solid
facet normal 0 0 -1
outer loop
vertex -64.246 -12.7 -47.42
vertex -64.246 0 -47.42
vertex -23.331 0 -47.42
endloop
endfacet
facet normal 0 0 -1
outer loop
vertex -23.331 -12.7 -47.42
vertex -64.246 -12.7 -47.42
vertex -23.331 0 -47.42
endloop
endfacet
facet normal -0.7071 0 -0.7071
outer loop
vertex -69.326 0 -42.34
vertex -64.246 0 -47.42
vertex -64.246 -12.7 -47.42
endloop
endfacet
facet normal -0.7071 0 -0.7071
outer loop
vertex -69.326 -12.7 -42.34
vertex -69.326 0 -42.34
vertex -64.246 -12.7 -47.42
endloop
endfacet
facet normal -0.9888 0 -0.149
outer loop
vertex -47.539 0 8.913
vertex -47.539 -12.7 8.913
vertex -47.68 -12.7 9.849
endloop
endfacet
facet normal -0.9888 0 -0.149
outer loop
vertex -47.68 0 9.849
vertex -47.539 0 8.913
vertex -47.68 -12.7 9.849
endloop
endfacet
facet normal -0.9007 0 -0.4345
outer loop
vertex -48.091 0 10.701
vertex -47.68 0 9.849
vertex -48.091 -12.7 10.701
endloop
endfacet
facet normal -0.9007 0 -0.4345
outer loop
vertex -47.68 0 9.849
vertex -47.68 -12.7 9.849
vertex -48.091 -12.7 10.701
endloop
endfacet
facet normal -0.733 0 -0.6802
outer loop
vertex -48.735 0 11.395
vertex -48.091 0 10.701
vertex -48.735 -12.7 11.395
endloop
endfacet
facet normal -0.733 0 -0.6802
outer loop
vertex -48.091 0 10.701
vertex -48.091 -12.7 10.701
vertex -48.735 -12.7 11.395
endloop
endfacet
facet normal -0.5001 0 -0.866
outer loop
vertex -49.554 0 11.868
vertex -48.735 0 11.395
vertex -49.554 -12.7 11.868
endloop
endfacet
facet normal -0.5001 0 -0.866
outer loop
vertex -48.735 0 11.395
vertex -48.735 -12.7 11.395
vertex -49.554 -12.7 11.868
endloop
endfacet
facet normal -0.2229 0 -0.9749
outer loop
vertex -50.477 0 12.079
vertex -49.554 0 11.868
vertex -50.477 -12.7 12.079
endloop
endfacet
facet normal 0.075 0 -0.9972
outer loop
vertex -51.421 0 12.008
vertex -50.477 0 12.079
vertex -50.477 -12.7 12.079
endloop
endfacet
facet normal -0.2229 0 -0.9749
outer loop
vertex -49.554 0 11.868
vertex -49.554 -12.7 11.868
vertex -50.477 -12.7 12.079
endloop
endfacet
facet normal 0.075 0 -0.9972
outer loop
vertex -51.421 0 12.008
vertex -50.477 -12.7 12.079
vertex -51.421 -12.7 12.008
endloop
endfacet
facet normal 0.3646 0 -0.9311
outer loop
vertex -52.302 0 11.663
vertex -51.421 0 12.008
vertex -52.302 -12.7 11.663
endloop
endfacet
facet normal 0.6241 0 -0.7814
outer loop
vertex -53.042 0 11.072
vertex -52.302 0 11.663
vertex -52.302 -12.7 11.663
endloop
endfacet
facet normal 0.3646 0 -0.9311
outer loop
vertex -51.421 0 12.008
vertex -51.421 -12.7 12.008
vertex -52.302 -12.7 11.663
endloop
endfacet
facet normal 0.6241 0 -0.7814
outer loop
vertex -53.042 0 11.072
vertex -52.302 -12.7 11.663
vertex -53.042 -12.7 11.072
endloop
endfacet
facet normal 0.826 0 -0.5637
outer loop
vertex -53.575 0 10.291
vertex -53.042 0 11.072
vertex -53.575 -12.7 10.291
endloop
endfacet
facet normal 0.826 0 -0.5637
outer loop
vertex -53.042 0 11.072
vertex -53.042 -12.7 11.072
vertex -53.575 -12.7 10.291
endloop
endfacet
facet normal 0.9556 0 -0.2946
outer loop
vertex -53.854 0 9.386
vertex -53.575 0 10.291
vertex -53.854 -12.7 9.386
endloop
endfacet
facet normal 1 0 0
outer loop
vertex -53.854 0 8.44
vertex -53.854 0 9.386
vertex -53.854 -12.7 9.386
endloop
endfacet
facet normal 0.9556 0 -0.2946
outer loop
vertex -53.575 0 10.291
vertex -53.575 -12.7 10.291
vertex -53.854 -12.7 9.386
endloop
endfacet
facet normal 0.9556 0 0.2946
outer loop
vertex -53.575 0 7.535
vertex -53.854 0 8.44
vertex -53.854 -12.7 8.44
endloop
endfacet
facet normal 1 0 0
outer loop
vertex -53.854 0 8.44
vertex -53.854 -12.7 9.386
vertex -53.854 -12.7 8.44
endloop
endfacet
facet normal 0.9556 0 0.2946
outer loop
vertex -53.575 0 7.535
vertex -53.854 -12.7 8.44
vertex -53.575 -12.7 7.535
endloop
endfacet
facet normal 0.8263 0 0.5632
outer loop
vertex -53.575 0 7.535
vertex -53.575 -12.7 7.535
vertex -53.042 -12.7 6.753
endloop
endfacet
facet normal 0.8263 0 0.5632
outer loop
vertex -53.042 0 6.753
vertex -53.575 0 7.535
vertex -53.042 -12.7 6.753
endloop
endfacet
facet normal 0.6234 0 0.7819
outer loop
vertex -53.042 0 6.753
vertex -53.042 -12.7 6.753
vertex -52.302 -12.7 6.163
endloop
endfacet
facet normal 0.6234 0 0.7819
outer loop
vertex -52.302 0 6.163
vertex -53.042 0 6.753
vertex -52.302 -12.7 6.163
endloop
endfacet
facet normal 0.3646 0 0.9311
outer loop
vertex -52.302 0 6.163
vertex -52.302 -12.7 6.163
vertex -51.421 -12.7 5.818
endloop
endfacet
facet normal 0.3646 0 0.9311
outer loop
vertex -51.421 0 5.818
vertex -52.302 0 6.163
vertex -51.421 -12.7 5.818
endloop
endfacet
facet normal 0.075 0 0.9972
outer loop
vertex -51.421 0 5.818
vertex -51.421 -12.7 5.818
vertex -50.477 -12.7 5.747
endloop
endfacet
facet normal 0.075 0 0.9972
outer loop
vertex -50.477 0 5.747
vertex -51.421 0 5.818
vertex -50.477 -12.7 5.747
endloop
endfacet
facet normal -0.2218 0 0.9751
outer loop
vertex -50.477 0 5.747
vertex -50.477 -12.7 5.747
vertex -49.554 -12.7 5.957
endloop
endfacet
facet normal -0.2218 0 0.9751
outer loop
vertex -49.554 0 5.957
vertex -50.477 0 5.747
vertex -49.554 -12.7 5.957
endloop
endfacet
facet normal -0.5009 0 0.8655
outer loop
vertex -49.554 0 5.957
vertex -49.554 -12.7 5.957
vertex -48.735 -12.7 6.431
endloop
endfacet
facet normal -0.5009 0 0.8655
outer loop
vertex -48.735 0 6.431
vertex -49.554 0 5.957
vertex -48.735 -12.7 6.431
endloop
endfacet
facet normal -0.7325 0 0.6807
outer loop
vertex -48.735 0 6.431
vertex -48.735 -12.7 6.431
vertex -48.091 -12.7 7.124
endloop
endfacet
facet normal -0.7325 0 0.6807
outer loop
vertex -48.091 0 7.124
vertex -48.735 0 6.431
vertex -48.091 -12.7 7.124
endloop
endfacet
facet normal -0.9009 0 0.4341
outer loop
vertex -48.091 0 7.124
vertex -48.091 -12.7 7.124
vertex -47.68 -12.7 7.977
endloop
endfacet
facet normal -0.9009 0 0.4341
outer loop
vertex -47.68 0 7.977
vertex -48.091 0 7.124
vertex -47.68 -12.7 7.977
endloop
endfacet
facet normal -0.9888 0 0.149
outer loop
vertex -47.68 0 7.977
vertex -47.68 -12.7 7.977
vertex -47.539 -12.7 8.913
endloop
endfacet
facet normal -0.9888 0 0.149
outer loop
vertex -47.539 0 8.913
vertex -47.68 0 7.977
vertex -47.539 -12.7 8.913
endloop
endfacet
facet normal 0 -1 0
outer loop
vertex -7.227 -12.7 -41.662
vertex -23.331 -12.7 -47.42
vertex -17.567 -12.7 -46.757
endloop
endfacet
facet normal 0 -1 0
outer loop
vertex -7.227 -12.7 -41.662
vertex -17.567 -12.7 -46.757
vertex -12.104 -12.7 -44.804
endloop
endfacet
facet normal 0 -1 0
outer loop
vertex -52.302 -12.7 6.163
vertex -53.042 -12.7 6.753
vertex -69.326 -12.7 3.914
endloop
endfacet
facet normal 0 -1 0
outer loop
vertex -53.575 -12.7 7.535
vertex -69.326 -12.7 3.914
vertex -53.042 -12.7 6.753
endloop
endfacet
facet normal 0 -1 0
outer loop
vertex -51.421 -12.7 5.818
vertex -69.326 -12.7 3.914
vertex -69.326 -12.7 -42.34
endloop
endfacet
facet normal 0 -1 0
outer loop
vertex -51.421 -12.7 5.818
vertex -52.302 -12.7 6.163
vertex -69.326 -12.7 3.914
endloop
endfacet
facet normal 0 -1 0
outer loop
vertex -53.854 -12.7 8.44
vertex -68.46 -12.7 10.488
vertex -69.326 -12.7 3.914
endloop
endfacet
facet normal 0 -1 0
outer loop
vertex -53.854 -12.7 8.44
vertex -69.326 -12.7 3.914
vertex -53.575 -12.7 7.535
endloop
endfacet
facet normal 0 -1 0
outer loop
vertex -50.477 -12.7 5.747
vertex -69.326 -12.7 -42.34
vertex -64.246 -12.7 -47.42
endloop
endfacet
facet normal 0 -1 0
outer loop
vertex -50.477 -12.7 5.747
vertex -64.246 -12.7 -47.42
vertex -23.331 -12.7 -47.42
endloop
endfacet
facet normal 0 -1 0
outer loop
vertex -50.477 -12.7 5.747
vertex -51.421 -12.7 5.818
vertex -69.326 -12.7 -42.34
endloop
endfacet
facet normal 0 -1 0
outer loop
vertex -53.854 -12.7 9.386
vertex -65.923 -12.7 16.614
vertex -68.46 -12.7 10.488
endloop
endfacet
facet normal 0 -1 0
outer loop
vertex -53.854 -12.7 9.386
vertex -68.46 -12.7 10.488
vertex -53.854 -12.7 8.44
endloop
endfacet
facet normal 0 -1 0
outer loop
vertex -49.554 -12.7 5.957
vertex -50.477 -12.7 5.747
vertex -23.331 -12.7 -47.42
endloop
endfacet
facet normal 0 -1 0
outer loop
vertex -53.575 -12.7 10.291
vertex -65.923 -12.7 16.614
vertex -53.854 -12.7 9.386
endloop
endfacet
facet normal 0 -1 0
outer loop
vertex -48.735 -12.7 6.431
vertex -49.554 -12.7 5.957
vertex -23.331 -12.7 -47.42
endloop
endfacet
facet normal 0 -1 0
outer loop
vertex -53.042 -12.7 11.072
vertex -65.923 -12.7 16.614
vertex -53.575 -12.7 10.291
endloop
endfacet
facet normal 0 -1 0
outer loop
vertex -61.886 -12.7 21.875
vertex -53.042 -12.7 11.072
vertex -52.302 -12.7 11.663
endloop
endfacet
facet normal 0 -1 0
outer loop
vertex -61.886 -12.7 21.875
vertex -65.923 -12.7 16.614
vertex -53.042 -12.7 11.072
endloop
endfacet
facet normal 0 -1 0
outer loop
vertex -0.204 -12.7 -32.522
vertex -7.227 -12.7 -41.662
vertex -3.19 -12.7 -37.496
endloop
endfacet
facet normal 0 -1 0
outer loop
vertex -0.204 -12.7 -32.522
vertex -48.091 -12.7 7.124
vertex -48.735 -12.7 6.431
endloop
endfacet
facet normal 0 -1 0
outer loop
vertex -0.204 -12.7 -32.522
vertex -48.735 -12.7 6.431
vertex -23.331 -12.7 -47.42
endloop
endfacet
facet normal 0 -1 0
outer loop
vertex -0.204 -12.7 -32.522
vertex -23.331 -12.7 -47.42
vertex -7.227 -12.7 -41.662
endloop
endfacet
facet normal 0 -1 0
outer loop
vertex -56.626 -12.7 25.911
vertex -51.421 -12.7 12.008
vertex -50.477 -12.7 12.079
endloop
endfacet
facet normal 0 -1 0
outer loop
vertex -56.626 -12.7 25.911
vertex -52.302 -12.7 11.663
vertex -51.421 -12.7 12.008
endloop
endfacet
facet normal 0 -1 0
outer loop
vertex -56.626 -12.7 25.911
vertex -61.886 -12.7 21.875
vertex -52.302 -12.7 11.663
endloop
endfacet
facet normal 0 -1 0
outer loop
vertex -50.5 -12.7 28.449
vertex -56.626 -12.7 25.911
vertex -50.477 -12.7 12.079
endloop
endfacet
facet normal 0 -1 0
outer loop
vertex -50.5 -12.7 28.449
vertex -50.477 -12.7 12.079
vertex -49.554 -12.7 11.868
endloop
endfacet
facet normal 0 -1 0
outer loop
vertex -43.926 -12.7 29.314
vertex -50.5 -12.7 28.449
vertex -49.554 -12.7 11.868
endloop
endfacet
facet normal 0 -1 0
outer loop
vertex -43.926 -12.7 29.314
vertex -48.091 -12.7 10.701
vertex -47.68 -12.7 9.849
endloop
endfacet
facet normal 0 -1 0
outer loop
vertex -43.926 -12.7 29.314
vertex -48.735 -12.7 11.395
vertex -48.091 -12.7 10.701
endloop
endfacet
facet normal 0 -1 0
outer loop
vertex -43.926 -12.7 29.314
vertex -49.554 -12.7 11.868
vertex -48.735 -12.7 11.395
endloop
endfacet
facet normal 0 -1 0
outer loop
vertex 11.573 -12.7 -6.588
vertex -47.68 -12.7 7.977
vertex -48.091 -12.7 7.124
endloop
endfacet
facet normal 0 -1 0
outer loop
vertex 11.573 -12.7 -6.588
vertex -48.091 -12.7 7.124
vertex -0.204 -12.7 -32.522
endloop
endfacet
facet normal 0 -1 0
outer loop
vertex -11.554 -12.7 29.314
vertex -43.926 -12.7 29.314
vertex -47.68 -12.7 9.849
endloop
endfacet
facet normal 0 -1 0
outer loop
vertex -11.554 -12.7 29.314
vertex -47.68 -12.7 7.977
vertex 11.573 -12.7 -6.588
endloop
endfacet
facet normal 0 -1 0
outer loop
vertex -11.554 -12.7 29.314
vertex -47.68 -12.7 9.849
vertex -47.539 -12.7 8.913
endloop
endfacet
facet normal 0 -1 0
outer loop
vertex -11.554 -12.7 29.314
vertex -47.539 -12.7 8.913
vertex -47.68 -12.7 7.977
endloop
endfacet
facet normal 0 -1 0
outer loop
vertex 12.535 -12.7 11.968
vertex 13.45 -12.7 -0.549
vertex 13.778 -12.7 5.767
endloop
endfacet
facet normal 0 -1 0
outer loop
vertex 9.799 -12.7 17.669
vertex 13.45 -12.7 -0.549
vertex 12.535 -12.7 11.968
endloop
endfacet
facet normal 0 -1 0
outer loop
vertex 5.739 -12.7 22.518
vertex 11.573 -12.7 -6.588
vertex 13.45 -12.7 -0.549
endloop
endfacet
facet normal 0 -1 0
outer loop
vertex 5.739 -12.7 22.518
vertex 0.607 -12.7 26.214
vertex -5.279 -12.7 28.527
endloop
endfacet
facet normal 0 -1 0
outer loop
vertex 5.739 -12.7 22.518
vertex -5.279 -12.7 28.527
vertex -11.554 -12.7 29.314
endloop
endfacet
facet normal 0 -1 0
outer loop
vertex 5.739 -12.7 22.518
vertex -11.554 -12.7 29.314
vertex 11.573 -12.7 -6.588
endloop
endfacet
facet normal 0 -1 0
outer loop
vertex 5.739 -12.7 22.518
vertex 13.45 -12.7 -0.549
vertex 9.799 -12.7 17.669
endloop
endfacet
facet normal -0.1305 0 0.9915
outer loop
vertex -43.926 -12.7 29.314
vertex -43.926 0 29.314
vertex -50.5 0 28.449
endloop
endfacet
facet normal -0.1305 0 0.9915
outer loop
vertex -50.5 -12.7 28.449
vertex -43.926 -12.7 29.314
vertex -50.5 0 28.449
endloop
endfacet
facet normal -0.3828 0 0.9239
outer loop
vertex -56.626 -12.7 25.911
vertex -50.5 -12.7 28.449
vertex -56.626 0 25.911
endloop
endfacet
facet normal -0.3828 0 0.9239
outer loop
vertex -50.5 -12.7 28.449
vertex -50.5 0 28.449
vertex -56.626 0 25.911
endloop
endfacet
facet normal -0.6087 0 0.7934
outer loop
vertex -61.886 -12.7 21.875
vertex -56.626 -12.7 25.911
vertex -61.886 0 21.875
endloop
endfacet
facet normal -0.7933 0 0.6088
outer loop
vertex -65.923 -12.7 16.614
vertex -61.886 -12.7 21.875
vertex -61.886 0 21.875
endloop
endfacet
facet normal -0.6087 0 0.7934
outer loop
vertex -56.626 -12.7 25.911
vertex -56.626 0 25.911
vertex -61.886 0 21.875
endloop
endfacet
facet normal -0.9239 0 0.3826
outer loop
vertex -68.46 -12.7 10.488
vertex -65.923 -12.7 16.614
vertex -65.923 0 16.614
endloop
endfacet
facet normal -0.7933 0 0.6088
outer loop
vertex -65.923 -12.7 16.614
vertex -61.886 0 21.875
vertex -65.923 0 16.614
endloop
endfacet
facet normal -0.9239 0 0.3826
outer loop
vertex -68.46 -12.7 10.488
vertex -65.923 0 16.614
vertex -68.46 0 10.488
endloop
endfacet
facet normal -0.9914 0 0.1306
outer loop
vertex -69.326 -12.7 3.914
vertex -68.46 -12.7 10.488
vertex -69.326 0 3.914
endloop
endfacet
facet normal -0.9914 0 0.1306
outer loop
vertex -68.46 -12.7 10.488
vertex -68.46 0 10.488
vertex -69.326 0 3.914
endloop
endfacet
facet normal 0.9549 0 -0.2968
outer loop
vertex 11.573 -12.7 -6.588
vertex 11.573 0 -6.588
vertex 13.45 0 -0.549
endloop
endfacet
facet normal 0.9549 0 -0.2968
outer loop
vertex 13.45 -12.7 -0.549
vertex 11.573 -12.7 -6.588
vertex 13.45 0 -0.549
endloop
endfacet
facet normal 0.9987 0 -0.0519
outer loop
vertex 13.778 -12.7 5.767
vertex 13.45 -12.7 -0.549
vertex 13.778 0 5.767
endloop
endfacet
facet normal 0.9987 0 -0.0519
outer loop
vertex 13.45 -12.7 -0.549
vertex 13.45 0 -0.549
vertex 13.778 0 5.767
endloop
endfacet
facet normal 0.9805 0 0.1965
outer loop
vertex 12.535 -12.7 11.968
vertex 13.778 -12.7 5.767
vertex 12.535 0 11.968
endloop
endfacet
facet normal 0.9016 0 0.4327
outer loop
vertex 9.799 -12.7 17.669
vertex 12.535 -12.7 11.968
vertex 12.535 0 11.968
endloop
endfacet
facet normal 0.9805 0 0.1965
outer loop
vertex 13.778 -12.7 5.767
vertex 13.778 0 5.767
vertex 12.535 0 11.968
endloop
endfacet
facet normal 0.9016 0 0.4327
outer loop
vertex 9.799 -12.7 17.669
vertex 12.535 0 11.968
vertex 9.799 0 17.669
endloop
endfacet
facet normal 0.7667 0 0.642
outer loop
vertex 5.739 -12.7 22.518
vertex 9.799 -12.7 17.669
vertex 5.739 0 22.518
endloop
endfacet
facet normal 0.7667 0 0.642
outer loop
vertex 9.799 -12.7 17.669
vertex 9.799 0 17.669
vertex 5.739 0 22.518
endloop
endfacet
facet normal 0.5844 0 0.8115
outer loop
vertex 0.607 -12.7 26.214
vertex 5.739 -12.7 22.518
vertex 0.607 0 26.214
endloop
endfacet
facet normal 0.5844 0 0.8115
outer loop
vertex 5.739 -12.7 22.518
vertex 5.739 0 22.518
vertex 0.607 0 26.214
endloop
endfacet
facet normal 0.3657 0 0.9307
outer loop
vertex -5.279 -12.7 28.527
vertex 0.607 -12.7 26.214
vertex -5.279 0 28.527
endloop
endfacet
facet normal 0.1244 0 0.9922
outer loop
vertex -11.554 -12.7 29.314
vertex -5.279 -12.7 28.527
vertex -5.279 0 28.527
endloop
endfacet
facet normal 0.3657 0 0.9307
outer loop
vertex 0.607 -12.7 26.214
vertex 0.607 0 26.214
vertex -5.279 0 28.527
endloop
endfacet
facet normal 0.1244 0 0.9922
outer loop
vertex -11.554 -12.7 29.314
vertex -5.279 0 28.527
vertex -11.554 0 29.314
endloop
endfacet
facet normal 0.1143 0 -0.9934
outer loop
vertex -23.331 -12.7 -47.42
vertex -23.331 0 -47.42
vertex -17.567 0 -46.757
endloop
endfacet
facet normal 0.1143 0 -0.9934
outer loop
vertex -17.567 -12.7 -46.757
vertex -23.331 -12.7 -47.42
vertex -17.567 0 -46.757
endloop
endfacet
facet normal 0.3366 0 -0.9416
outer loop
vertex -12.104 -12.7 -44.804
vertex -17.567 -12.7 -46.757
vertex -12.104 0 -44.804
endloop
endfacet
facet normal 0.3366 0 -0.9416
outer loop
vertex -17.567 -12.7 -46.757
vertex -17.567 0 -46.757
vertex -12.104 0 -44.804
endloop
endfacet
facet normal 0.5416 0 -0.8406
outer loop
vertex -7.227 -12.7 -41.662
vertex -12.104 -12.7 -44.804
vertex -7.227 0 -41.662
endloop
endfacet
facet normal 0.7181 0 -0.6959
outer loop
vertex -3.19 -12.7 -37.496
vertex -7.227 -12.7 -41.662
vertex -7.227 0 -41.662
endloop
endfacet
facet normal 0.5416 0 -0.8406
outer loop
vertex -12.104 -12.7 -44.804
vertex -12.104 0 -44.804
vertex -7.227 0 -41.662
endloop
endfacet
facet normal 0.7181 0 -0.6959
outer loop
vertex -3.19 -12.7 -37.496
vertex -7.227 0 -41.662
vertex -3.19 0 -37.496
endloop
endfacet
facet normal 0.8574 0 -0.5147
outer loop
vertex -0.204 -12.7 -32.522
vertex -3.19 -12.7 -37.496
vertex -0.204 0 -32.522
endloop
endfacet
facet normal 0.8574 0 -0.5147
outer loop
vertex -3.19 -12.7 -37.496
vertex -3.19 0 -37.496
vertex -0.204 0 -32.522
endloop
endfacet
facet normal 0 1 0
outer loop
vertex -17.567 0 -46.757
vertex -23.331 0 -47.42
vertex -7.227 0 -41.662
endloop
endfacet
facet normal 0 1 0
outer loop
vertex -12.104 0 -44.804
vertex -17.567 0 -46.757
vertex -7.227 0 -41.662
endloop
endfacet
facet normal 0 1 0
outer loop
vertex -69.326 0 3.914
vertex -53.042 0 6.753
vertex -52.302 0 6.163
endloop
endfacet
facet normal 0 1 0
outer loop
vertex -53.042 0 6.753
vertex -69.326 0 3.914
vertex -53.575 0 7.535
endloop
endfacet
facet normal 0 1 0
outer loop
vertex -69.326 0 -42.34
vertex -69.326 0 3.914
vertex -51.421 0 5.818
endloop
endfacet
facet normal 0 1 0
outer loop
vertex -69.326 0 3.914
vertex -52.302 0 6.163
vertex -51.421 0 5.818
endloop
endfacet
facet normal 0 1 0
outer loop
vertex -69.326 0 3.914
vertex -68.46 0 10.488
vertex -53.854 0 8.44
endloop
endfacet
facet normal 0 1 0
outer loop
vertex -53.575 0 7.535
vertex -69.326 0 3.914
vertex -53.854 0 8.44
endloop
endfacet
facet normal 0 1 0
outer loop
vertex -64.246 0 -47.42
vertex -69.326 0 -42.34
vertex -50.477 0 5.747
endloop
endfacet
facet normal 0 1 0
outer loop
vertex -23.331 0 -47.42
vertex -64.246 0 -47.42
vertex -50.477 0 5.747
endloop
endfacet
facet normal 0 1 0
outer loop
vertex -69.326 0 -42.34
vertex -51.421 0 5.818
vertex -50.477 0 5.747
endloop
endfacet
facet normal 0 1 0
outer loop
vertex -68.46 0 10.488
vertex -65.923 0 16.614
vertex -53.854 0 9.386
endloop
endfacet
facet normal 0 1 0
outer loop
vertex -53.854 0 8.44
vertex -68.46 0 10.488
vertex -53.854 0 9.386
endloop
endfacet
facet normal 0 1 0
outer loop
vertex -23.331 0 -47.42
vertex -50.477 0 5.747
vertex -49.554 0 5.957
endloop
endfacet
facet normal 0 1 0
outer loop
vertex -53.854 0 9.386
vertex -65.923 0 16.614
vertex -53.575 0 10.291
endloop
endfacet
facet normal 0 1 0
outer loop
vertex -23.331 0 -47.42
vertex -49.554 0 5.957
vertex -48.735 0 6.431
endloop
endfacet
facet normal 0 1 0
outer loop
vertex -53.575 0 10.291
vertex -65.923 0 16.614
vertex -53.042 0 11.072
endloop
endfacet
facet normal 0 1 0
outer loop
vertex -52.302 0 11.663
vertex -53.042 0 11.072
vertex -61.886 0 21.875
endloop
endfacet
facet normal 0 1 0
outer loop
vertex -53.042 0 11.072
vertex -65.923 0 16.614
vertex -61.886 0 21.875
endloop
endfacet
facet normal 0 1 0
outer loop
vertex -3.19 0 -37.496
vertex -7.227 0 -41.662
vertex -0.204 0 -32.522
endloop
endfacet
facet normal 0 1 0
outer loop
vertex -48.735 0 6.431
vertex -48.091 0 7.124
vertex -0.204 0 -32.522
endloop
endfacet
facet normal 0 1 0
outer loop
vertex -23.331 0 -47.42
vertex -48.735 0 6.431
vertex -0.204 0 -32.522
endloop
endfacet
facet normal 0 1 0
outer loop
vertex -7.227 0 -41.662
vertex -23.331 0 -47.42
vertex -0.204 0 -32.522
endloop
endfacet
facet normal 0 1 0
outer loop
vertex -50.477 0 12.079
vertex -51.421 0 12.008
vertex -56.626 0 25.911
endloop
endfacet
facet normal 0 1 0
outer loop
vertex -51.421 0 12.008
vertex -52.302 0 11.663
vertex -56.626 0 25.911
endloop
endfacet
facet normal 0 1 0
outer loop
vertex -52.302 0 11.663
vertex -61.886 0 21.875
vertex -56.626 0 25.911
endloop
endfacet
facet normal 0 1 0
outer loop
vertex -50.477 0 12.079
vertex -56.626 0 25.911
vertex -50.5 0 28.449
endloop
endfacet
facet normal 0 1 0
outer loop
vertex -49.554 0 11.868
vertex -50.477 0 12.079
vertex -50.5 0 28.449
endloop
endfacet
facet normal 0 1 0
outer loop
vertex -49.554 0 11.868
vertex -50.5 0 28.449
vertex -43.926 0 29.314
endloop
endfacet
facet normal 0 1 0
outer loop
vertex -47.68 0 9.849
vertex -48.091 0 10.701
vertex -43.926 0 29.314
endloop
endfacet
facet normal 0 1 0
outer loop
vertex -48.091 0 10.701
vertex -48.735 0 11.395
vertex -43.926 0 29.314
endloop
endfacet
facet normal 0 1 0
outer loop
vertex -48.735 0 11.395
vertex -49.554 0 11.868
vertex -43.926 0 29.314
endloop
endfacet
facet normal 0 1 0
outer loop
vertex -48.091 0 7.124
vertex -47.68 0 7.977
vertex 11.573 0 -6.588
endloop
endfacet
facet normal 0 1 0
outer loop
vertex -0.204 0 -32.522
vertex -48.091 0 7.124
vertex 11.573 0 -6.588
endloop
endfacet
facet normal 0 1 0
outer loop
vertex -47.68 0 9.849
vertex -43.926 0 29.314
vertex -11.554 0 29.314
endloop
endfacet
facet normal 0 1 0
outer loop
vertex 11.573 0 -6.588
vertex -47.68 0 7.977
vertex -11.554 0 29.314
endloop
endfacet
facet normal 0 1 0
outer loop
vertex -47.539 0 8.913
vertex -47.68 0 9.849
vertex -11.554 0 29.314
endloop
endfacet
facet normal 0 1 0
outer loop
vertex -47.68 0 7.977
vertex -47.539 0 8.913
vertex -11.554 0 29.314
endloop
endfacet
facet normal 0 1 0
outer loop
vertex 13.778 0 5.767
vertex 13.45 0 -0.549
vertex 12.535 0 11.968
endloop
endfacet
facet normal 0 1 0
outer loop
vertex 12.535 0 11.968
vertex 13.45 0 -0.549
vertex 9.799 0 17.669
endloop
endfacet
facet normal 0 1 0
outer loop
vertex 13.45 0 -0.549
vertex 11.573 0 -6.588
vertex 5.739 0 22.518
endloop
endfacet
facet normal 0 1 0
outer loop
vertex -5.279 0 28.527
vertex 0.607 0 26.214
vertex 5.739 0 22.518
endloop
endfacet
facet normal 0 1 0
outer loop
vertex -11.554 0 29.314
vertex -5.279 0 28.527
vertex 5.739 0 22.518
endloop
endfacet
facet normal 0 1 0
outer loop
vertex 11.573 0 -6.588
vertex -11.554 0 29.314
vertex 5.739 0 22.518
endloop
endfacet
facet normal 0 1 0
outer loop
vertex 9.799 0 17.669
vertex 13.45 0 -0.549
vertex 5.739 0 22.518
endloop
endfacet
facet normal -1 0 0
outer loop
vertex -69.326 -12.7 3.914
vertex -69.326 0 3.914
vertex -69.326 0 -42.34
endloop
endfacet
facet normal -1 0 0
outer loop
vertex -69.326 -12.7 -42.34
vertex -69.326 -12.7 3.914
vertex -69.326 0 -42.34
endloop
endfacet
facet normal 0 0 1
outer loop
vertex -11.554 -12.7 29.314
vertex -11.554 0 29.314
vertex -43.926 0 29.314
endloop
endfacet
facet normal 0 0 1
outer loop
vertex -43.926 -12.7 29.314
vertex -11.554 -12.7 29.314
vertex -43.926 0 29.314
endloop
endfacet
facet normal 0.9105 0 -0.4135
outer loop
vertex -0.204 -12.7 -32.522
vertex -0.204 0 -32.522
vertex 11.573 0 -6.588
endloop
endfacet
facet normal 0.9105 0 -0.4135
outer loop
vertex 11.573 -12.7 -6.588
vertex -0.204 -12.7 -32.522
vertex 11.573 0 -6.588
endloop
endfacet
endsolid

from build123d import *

# Parameters (mm, degrees)
F1_DEPTH = 12.7
F3_D     = 6.35
F4_SIZE  = 5.08


with BuildPart() as f1:
    # F0 (on Front) → F1 (new body)
    with BuildSketch(Plane.XZ):
        with BuildLine():
            ThreePointArc((-43.925832, 29.31416), (-61.886345, 21.874673), (-69.325832, 3.91416))
            Line((-69.325832, 3.91416), (-69.325832, -47.419965))
            Line((-69.325832, -47.419965), (-23.331021, -47.419965))
            ThreePointArc((-23.331021, -47.419965), (-9.575842, -43.37307), (-0.203796, -32.521939))
            Line((-0.203796, -32.521939), (11.572779, -6.587813))
            ThreePointArc((11.572779, -6.587813), (9.798658, 17.669339), (-11.554446, 29.31416))
            Line((-11.554446, 29.31416), (-43.925832, 29.31416))
        make_face()
    extrude(amount=F1_DEPTH)

    # F3 (through all)
    with Locations(Plane(origin=(0, 0, 0), x_dir=(-1, 0, 0), z_dir=(0, 1, 0))):
        with Locations((50.714333, 8.912938)):
            Hole(F3_D / 2)

    # F4
    f4_edges = [f1.edges().sort_by_distance(p)[0] for p in [
        (-69.325832, -6.35, -47.419965),
    ]]
    chamfer(f4_edges, length=F4_SIZE)


solid = f1.part
